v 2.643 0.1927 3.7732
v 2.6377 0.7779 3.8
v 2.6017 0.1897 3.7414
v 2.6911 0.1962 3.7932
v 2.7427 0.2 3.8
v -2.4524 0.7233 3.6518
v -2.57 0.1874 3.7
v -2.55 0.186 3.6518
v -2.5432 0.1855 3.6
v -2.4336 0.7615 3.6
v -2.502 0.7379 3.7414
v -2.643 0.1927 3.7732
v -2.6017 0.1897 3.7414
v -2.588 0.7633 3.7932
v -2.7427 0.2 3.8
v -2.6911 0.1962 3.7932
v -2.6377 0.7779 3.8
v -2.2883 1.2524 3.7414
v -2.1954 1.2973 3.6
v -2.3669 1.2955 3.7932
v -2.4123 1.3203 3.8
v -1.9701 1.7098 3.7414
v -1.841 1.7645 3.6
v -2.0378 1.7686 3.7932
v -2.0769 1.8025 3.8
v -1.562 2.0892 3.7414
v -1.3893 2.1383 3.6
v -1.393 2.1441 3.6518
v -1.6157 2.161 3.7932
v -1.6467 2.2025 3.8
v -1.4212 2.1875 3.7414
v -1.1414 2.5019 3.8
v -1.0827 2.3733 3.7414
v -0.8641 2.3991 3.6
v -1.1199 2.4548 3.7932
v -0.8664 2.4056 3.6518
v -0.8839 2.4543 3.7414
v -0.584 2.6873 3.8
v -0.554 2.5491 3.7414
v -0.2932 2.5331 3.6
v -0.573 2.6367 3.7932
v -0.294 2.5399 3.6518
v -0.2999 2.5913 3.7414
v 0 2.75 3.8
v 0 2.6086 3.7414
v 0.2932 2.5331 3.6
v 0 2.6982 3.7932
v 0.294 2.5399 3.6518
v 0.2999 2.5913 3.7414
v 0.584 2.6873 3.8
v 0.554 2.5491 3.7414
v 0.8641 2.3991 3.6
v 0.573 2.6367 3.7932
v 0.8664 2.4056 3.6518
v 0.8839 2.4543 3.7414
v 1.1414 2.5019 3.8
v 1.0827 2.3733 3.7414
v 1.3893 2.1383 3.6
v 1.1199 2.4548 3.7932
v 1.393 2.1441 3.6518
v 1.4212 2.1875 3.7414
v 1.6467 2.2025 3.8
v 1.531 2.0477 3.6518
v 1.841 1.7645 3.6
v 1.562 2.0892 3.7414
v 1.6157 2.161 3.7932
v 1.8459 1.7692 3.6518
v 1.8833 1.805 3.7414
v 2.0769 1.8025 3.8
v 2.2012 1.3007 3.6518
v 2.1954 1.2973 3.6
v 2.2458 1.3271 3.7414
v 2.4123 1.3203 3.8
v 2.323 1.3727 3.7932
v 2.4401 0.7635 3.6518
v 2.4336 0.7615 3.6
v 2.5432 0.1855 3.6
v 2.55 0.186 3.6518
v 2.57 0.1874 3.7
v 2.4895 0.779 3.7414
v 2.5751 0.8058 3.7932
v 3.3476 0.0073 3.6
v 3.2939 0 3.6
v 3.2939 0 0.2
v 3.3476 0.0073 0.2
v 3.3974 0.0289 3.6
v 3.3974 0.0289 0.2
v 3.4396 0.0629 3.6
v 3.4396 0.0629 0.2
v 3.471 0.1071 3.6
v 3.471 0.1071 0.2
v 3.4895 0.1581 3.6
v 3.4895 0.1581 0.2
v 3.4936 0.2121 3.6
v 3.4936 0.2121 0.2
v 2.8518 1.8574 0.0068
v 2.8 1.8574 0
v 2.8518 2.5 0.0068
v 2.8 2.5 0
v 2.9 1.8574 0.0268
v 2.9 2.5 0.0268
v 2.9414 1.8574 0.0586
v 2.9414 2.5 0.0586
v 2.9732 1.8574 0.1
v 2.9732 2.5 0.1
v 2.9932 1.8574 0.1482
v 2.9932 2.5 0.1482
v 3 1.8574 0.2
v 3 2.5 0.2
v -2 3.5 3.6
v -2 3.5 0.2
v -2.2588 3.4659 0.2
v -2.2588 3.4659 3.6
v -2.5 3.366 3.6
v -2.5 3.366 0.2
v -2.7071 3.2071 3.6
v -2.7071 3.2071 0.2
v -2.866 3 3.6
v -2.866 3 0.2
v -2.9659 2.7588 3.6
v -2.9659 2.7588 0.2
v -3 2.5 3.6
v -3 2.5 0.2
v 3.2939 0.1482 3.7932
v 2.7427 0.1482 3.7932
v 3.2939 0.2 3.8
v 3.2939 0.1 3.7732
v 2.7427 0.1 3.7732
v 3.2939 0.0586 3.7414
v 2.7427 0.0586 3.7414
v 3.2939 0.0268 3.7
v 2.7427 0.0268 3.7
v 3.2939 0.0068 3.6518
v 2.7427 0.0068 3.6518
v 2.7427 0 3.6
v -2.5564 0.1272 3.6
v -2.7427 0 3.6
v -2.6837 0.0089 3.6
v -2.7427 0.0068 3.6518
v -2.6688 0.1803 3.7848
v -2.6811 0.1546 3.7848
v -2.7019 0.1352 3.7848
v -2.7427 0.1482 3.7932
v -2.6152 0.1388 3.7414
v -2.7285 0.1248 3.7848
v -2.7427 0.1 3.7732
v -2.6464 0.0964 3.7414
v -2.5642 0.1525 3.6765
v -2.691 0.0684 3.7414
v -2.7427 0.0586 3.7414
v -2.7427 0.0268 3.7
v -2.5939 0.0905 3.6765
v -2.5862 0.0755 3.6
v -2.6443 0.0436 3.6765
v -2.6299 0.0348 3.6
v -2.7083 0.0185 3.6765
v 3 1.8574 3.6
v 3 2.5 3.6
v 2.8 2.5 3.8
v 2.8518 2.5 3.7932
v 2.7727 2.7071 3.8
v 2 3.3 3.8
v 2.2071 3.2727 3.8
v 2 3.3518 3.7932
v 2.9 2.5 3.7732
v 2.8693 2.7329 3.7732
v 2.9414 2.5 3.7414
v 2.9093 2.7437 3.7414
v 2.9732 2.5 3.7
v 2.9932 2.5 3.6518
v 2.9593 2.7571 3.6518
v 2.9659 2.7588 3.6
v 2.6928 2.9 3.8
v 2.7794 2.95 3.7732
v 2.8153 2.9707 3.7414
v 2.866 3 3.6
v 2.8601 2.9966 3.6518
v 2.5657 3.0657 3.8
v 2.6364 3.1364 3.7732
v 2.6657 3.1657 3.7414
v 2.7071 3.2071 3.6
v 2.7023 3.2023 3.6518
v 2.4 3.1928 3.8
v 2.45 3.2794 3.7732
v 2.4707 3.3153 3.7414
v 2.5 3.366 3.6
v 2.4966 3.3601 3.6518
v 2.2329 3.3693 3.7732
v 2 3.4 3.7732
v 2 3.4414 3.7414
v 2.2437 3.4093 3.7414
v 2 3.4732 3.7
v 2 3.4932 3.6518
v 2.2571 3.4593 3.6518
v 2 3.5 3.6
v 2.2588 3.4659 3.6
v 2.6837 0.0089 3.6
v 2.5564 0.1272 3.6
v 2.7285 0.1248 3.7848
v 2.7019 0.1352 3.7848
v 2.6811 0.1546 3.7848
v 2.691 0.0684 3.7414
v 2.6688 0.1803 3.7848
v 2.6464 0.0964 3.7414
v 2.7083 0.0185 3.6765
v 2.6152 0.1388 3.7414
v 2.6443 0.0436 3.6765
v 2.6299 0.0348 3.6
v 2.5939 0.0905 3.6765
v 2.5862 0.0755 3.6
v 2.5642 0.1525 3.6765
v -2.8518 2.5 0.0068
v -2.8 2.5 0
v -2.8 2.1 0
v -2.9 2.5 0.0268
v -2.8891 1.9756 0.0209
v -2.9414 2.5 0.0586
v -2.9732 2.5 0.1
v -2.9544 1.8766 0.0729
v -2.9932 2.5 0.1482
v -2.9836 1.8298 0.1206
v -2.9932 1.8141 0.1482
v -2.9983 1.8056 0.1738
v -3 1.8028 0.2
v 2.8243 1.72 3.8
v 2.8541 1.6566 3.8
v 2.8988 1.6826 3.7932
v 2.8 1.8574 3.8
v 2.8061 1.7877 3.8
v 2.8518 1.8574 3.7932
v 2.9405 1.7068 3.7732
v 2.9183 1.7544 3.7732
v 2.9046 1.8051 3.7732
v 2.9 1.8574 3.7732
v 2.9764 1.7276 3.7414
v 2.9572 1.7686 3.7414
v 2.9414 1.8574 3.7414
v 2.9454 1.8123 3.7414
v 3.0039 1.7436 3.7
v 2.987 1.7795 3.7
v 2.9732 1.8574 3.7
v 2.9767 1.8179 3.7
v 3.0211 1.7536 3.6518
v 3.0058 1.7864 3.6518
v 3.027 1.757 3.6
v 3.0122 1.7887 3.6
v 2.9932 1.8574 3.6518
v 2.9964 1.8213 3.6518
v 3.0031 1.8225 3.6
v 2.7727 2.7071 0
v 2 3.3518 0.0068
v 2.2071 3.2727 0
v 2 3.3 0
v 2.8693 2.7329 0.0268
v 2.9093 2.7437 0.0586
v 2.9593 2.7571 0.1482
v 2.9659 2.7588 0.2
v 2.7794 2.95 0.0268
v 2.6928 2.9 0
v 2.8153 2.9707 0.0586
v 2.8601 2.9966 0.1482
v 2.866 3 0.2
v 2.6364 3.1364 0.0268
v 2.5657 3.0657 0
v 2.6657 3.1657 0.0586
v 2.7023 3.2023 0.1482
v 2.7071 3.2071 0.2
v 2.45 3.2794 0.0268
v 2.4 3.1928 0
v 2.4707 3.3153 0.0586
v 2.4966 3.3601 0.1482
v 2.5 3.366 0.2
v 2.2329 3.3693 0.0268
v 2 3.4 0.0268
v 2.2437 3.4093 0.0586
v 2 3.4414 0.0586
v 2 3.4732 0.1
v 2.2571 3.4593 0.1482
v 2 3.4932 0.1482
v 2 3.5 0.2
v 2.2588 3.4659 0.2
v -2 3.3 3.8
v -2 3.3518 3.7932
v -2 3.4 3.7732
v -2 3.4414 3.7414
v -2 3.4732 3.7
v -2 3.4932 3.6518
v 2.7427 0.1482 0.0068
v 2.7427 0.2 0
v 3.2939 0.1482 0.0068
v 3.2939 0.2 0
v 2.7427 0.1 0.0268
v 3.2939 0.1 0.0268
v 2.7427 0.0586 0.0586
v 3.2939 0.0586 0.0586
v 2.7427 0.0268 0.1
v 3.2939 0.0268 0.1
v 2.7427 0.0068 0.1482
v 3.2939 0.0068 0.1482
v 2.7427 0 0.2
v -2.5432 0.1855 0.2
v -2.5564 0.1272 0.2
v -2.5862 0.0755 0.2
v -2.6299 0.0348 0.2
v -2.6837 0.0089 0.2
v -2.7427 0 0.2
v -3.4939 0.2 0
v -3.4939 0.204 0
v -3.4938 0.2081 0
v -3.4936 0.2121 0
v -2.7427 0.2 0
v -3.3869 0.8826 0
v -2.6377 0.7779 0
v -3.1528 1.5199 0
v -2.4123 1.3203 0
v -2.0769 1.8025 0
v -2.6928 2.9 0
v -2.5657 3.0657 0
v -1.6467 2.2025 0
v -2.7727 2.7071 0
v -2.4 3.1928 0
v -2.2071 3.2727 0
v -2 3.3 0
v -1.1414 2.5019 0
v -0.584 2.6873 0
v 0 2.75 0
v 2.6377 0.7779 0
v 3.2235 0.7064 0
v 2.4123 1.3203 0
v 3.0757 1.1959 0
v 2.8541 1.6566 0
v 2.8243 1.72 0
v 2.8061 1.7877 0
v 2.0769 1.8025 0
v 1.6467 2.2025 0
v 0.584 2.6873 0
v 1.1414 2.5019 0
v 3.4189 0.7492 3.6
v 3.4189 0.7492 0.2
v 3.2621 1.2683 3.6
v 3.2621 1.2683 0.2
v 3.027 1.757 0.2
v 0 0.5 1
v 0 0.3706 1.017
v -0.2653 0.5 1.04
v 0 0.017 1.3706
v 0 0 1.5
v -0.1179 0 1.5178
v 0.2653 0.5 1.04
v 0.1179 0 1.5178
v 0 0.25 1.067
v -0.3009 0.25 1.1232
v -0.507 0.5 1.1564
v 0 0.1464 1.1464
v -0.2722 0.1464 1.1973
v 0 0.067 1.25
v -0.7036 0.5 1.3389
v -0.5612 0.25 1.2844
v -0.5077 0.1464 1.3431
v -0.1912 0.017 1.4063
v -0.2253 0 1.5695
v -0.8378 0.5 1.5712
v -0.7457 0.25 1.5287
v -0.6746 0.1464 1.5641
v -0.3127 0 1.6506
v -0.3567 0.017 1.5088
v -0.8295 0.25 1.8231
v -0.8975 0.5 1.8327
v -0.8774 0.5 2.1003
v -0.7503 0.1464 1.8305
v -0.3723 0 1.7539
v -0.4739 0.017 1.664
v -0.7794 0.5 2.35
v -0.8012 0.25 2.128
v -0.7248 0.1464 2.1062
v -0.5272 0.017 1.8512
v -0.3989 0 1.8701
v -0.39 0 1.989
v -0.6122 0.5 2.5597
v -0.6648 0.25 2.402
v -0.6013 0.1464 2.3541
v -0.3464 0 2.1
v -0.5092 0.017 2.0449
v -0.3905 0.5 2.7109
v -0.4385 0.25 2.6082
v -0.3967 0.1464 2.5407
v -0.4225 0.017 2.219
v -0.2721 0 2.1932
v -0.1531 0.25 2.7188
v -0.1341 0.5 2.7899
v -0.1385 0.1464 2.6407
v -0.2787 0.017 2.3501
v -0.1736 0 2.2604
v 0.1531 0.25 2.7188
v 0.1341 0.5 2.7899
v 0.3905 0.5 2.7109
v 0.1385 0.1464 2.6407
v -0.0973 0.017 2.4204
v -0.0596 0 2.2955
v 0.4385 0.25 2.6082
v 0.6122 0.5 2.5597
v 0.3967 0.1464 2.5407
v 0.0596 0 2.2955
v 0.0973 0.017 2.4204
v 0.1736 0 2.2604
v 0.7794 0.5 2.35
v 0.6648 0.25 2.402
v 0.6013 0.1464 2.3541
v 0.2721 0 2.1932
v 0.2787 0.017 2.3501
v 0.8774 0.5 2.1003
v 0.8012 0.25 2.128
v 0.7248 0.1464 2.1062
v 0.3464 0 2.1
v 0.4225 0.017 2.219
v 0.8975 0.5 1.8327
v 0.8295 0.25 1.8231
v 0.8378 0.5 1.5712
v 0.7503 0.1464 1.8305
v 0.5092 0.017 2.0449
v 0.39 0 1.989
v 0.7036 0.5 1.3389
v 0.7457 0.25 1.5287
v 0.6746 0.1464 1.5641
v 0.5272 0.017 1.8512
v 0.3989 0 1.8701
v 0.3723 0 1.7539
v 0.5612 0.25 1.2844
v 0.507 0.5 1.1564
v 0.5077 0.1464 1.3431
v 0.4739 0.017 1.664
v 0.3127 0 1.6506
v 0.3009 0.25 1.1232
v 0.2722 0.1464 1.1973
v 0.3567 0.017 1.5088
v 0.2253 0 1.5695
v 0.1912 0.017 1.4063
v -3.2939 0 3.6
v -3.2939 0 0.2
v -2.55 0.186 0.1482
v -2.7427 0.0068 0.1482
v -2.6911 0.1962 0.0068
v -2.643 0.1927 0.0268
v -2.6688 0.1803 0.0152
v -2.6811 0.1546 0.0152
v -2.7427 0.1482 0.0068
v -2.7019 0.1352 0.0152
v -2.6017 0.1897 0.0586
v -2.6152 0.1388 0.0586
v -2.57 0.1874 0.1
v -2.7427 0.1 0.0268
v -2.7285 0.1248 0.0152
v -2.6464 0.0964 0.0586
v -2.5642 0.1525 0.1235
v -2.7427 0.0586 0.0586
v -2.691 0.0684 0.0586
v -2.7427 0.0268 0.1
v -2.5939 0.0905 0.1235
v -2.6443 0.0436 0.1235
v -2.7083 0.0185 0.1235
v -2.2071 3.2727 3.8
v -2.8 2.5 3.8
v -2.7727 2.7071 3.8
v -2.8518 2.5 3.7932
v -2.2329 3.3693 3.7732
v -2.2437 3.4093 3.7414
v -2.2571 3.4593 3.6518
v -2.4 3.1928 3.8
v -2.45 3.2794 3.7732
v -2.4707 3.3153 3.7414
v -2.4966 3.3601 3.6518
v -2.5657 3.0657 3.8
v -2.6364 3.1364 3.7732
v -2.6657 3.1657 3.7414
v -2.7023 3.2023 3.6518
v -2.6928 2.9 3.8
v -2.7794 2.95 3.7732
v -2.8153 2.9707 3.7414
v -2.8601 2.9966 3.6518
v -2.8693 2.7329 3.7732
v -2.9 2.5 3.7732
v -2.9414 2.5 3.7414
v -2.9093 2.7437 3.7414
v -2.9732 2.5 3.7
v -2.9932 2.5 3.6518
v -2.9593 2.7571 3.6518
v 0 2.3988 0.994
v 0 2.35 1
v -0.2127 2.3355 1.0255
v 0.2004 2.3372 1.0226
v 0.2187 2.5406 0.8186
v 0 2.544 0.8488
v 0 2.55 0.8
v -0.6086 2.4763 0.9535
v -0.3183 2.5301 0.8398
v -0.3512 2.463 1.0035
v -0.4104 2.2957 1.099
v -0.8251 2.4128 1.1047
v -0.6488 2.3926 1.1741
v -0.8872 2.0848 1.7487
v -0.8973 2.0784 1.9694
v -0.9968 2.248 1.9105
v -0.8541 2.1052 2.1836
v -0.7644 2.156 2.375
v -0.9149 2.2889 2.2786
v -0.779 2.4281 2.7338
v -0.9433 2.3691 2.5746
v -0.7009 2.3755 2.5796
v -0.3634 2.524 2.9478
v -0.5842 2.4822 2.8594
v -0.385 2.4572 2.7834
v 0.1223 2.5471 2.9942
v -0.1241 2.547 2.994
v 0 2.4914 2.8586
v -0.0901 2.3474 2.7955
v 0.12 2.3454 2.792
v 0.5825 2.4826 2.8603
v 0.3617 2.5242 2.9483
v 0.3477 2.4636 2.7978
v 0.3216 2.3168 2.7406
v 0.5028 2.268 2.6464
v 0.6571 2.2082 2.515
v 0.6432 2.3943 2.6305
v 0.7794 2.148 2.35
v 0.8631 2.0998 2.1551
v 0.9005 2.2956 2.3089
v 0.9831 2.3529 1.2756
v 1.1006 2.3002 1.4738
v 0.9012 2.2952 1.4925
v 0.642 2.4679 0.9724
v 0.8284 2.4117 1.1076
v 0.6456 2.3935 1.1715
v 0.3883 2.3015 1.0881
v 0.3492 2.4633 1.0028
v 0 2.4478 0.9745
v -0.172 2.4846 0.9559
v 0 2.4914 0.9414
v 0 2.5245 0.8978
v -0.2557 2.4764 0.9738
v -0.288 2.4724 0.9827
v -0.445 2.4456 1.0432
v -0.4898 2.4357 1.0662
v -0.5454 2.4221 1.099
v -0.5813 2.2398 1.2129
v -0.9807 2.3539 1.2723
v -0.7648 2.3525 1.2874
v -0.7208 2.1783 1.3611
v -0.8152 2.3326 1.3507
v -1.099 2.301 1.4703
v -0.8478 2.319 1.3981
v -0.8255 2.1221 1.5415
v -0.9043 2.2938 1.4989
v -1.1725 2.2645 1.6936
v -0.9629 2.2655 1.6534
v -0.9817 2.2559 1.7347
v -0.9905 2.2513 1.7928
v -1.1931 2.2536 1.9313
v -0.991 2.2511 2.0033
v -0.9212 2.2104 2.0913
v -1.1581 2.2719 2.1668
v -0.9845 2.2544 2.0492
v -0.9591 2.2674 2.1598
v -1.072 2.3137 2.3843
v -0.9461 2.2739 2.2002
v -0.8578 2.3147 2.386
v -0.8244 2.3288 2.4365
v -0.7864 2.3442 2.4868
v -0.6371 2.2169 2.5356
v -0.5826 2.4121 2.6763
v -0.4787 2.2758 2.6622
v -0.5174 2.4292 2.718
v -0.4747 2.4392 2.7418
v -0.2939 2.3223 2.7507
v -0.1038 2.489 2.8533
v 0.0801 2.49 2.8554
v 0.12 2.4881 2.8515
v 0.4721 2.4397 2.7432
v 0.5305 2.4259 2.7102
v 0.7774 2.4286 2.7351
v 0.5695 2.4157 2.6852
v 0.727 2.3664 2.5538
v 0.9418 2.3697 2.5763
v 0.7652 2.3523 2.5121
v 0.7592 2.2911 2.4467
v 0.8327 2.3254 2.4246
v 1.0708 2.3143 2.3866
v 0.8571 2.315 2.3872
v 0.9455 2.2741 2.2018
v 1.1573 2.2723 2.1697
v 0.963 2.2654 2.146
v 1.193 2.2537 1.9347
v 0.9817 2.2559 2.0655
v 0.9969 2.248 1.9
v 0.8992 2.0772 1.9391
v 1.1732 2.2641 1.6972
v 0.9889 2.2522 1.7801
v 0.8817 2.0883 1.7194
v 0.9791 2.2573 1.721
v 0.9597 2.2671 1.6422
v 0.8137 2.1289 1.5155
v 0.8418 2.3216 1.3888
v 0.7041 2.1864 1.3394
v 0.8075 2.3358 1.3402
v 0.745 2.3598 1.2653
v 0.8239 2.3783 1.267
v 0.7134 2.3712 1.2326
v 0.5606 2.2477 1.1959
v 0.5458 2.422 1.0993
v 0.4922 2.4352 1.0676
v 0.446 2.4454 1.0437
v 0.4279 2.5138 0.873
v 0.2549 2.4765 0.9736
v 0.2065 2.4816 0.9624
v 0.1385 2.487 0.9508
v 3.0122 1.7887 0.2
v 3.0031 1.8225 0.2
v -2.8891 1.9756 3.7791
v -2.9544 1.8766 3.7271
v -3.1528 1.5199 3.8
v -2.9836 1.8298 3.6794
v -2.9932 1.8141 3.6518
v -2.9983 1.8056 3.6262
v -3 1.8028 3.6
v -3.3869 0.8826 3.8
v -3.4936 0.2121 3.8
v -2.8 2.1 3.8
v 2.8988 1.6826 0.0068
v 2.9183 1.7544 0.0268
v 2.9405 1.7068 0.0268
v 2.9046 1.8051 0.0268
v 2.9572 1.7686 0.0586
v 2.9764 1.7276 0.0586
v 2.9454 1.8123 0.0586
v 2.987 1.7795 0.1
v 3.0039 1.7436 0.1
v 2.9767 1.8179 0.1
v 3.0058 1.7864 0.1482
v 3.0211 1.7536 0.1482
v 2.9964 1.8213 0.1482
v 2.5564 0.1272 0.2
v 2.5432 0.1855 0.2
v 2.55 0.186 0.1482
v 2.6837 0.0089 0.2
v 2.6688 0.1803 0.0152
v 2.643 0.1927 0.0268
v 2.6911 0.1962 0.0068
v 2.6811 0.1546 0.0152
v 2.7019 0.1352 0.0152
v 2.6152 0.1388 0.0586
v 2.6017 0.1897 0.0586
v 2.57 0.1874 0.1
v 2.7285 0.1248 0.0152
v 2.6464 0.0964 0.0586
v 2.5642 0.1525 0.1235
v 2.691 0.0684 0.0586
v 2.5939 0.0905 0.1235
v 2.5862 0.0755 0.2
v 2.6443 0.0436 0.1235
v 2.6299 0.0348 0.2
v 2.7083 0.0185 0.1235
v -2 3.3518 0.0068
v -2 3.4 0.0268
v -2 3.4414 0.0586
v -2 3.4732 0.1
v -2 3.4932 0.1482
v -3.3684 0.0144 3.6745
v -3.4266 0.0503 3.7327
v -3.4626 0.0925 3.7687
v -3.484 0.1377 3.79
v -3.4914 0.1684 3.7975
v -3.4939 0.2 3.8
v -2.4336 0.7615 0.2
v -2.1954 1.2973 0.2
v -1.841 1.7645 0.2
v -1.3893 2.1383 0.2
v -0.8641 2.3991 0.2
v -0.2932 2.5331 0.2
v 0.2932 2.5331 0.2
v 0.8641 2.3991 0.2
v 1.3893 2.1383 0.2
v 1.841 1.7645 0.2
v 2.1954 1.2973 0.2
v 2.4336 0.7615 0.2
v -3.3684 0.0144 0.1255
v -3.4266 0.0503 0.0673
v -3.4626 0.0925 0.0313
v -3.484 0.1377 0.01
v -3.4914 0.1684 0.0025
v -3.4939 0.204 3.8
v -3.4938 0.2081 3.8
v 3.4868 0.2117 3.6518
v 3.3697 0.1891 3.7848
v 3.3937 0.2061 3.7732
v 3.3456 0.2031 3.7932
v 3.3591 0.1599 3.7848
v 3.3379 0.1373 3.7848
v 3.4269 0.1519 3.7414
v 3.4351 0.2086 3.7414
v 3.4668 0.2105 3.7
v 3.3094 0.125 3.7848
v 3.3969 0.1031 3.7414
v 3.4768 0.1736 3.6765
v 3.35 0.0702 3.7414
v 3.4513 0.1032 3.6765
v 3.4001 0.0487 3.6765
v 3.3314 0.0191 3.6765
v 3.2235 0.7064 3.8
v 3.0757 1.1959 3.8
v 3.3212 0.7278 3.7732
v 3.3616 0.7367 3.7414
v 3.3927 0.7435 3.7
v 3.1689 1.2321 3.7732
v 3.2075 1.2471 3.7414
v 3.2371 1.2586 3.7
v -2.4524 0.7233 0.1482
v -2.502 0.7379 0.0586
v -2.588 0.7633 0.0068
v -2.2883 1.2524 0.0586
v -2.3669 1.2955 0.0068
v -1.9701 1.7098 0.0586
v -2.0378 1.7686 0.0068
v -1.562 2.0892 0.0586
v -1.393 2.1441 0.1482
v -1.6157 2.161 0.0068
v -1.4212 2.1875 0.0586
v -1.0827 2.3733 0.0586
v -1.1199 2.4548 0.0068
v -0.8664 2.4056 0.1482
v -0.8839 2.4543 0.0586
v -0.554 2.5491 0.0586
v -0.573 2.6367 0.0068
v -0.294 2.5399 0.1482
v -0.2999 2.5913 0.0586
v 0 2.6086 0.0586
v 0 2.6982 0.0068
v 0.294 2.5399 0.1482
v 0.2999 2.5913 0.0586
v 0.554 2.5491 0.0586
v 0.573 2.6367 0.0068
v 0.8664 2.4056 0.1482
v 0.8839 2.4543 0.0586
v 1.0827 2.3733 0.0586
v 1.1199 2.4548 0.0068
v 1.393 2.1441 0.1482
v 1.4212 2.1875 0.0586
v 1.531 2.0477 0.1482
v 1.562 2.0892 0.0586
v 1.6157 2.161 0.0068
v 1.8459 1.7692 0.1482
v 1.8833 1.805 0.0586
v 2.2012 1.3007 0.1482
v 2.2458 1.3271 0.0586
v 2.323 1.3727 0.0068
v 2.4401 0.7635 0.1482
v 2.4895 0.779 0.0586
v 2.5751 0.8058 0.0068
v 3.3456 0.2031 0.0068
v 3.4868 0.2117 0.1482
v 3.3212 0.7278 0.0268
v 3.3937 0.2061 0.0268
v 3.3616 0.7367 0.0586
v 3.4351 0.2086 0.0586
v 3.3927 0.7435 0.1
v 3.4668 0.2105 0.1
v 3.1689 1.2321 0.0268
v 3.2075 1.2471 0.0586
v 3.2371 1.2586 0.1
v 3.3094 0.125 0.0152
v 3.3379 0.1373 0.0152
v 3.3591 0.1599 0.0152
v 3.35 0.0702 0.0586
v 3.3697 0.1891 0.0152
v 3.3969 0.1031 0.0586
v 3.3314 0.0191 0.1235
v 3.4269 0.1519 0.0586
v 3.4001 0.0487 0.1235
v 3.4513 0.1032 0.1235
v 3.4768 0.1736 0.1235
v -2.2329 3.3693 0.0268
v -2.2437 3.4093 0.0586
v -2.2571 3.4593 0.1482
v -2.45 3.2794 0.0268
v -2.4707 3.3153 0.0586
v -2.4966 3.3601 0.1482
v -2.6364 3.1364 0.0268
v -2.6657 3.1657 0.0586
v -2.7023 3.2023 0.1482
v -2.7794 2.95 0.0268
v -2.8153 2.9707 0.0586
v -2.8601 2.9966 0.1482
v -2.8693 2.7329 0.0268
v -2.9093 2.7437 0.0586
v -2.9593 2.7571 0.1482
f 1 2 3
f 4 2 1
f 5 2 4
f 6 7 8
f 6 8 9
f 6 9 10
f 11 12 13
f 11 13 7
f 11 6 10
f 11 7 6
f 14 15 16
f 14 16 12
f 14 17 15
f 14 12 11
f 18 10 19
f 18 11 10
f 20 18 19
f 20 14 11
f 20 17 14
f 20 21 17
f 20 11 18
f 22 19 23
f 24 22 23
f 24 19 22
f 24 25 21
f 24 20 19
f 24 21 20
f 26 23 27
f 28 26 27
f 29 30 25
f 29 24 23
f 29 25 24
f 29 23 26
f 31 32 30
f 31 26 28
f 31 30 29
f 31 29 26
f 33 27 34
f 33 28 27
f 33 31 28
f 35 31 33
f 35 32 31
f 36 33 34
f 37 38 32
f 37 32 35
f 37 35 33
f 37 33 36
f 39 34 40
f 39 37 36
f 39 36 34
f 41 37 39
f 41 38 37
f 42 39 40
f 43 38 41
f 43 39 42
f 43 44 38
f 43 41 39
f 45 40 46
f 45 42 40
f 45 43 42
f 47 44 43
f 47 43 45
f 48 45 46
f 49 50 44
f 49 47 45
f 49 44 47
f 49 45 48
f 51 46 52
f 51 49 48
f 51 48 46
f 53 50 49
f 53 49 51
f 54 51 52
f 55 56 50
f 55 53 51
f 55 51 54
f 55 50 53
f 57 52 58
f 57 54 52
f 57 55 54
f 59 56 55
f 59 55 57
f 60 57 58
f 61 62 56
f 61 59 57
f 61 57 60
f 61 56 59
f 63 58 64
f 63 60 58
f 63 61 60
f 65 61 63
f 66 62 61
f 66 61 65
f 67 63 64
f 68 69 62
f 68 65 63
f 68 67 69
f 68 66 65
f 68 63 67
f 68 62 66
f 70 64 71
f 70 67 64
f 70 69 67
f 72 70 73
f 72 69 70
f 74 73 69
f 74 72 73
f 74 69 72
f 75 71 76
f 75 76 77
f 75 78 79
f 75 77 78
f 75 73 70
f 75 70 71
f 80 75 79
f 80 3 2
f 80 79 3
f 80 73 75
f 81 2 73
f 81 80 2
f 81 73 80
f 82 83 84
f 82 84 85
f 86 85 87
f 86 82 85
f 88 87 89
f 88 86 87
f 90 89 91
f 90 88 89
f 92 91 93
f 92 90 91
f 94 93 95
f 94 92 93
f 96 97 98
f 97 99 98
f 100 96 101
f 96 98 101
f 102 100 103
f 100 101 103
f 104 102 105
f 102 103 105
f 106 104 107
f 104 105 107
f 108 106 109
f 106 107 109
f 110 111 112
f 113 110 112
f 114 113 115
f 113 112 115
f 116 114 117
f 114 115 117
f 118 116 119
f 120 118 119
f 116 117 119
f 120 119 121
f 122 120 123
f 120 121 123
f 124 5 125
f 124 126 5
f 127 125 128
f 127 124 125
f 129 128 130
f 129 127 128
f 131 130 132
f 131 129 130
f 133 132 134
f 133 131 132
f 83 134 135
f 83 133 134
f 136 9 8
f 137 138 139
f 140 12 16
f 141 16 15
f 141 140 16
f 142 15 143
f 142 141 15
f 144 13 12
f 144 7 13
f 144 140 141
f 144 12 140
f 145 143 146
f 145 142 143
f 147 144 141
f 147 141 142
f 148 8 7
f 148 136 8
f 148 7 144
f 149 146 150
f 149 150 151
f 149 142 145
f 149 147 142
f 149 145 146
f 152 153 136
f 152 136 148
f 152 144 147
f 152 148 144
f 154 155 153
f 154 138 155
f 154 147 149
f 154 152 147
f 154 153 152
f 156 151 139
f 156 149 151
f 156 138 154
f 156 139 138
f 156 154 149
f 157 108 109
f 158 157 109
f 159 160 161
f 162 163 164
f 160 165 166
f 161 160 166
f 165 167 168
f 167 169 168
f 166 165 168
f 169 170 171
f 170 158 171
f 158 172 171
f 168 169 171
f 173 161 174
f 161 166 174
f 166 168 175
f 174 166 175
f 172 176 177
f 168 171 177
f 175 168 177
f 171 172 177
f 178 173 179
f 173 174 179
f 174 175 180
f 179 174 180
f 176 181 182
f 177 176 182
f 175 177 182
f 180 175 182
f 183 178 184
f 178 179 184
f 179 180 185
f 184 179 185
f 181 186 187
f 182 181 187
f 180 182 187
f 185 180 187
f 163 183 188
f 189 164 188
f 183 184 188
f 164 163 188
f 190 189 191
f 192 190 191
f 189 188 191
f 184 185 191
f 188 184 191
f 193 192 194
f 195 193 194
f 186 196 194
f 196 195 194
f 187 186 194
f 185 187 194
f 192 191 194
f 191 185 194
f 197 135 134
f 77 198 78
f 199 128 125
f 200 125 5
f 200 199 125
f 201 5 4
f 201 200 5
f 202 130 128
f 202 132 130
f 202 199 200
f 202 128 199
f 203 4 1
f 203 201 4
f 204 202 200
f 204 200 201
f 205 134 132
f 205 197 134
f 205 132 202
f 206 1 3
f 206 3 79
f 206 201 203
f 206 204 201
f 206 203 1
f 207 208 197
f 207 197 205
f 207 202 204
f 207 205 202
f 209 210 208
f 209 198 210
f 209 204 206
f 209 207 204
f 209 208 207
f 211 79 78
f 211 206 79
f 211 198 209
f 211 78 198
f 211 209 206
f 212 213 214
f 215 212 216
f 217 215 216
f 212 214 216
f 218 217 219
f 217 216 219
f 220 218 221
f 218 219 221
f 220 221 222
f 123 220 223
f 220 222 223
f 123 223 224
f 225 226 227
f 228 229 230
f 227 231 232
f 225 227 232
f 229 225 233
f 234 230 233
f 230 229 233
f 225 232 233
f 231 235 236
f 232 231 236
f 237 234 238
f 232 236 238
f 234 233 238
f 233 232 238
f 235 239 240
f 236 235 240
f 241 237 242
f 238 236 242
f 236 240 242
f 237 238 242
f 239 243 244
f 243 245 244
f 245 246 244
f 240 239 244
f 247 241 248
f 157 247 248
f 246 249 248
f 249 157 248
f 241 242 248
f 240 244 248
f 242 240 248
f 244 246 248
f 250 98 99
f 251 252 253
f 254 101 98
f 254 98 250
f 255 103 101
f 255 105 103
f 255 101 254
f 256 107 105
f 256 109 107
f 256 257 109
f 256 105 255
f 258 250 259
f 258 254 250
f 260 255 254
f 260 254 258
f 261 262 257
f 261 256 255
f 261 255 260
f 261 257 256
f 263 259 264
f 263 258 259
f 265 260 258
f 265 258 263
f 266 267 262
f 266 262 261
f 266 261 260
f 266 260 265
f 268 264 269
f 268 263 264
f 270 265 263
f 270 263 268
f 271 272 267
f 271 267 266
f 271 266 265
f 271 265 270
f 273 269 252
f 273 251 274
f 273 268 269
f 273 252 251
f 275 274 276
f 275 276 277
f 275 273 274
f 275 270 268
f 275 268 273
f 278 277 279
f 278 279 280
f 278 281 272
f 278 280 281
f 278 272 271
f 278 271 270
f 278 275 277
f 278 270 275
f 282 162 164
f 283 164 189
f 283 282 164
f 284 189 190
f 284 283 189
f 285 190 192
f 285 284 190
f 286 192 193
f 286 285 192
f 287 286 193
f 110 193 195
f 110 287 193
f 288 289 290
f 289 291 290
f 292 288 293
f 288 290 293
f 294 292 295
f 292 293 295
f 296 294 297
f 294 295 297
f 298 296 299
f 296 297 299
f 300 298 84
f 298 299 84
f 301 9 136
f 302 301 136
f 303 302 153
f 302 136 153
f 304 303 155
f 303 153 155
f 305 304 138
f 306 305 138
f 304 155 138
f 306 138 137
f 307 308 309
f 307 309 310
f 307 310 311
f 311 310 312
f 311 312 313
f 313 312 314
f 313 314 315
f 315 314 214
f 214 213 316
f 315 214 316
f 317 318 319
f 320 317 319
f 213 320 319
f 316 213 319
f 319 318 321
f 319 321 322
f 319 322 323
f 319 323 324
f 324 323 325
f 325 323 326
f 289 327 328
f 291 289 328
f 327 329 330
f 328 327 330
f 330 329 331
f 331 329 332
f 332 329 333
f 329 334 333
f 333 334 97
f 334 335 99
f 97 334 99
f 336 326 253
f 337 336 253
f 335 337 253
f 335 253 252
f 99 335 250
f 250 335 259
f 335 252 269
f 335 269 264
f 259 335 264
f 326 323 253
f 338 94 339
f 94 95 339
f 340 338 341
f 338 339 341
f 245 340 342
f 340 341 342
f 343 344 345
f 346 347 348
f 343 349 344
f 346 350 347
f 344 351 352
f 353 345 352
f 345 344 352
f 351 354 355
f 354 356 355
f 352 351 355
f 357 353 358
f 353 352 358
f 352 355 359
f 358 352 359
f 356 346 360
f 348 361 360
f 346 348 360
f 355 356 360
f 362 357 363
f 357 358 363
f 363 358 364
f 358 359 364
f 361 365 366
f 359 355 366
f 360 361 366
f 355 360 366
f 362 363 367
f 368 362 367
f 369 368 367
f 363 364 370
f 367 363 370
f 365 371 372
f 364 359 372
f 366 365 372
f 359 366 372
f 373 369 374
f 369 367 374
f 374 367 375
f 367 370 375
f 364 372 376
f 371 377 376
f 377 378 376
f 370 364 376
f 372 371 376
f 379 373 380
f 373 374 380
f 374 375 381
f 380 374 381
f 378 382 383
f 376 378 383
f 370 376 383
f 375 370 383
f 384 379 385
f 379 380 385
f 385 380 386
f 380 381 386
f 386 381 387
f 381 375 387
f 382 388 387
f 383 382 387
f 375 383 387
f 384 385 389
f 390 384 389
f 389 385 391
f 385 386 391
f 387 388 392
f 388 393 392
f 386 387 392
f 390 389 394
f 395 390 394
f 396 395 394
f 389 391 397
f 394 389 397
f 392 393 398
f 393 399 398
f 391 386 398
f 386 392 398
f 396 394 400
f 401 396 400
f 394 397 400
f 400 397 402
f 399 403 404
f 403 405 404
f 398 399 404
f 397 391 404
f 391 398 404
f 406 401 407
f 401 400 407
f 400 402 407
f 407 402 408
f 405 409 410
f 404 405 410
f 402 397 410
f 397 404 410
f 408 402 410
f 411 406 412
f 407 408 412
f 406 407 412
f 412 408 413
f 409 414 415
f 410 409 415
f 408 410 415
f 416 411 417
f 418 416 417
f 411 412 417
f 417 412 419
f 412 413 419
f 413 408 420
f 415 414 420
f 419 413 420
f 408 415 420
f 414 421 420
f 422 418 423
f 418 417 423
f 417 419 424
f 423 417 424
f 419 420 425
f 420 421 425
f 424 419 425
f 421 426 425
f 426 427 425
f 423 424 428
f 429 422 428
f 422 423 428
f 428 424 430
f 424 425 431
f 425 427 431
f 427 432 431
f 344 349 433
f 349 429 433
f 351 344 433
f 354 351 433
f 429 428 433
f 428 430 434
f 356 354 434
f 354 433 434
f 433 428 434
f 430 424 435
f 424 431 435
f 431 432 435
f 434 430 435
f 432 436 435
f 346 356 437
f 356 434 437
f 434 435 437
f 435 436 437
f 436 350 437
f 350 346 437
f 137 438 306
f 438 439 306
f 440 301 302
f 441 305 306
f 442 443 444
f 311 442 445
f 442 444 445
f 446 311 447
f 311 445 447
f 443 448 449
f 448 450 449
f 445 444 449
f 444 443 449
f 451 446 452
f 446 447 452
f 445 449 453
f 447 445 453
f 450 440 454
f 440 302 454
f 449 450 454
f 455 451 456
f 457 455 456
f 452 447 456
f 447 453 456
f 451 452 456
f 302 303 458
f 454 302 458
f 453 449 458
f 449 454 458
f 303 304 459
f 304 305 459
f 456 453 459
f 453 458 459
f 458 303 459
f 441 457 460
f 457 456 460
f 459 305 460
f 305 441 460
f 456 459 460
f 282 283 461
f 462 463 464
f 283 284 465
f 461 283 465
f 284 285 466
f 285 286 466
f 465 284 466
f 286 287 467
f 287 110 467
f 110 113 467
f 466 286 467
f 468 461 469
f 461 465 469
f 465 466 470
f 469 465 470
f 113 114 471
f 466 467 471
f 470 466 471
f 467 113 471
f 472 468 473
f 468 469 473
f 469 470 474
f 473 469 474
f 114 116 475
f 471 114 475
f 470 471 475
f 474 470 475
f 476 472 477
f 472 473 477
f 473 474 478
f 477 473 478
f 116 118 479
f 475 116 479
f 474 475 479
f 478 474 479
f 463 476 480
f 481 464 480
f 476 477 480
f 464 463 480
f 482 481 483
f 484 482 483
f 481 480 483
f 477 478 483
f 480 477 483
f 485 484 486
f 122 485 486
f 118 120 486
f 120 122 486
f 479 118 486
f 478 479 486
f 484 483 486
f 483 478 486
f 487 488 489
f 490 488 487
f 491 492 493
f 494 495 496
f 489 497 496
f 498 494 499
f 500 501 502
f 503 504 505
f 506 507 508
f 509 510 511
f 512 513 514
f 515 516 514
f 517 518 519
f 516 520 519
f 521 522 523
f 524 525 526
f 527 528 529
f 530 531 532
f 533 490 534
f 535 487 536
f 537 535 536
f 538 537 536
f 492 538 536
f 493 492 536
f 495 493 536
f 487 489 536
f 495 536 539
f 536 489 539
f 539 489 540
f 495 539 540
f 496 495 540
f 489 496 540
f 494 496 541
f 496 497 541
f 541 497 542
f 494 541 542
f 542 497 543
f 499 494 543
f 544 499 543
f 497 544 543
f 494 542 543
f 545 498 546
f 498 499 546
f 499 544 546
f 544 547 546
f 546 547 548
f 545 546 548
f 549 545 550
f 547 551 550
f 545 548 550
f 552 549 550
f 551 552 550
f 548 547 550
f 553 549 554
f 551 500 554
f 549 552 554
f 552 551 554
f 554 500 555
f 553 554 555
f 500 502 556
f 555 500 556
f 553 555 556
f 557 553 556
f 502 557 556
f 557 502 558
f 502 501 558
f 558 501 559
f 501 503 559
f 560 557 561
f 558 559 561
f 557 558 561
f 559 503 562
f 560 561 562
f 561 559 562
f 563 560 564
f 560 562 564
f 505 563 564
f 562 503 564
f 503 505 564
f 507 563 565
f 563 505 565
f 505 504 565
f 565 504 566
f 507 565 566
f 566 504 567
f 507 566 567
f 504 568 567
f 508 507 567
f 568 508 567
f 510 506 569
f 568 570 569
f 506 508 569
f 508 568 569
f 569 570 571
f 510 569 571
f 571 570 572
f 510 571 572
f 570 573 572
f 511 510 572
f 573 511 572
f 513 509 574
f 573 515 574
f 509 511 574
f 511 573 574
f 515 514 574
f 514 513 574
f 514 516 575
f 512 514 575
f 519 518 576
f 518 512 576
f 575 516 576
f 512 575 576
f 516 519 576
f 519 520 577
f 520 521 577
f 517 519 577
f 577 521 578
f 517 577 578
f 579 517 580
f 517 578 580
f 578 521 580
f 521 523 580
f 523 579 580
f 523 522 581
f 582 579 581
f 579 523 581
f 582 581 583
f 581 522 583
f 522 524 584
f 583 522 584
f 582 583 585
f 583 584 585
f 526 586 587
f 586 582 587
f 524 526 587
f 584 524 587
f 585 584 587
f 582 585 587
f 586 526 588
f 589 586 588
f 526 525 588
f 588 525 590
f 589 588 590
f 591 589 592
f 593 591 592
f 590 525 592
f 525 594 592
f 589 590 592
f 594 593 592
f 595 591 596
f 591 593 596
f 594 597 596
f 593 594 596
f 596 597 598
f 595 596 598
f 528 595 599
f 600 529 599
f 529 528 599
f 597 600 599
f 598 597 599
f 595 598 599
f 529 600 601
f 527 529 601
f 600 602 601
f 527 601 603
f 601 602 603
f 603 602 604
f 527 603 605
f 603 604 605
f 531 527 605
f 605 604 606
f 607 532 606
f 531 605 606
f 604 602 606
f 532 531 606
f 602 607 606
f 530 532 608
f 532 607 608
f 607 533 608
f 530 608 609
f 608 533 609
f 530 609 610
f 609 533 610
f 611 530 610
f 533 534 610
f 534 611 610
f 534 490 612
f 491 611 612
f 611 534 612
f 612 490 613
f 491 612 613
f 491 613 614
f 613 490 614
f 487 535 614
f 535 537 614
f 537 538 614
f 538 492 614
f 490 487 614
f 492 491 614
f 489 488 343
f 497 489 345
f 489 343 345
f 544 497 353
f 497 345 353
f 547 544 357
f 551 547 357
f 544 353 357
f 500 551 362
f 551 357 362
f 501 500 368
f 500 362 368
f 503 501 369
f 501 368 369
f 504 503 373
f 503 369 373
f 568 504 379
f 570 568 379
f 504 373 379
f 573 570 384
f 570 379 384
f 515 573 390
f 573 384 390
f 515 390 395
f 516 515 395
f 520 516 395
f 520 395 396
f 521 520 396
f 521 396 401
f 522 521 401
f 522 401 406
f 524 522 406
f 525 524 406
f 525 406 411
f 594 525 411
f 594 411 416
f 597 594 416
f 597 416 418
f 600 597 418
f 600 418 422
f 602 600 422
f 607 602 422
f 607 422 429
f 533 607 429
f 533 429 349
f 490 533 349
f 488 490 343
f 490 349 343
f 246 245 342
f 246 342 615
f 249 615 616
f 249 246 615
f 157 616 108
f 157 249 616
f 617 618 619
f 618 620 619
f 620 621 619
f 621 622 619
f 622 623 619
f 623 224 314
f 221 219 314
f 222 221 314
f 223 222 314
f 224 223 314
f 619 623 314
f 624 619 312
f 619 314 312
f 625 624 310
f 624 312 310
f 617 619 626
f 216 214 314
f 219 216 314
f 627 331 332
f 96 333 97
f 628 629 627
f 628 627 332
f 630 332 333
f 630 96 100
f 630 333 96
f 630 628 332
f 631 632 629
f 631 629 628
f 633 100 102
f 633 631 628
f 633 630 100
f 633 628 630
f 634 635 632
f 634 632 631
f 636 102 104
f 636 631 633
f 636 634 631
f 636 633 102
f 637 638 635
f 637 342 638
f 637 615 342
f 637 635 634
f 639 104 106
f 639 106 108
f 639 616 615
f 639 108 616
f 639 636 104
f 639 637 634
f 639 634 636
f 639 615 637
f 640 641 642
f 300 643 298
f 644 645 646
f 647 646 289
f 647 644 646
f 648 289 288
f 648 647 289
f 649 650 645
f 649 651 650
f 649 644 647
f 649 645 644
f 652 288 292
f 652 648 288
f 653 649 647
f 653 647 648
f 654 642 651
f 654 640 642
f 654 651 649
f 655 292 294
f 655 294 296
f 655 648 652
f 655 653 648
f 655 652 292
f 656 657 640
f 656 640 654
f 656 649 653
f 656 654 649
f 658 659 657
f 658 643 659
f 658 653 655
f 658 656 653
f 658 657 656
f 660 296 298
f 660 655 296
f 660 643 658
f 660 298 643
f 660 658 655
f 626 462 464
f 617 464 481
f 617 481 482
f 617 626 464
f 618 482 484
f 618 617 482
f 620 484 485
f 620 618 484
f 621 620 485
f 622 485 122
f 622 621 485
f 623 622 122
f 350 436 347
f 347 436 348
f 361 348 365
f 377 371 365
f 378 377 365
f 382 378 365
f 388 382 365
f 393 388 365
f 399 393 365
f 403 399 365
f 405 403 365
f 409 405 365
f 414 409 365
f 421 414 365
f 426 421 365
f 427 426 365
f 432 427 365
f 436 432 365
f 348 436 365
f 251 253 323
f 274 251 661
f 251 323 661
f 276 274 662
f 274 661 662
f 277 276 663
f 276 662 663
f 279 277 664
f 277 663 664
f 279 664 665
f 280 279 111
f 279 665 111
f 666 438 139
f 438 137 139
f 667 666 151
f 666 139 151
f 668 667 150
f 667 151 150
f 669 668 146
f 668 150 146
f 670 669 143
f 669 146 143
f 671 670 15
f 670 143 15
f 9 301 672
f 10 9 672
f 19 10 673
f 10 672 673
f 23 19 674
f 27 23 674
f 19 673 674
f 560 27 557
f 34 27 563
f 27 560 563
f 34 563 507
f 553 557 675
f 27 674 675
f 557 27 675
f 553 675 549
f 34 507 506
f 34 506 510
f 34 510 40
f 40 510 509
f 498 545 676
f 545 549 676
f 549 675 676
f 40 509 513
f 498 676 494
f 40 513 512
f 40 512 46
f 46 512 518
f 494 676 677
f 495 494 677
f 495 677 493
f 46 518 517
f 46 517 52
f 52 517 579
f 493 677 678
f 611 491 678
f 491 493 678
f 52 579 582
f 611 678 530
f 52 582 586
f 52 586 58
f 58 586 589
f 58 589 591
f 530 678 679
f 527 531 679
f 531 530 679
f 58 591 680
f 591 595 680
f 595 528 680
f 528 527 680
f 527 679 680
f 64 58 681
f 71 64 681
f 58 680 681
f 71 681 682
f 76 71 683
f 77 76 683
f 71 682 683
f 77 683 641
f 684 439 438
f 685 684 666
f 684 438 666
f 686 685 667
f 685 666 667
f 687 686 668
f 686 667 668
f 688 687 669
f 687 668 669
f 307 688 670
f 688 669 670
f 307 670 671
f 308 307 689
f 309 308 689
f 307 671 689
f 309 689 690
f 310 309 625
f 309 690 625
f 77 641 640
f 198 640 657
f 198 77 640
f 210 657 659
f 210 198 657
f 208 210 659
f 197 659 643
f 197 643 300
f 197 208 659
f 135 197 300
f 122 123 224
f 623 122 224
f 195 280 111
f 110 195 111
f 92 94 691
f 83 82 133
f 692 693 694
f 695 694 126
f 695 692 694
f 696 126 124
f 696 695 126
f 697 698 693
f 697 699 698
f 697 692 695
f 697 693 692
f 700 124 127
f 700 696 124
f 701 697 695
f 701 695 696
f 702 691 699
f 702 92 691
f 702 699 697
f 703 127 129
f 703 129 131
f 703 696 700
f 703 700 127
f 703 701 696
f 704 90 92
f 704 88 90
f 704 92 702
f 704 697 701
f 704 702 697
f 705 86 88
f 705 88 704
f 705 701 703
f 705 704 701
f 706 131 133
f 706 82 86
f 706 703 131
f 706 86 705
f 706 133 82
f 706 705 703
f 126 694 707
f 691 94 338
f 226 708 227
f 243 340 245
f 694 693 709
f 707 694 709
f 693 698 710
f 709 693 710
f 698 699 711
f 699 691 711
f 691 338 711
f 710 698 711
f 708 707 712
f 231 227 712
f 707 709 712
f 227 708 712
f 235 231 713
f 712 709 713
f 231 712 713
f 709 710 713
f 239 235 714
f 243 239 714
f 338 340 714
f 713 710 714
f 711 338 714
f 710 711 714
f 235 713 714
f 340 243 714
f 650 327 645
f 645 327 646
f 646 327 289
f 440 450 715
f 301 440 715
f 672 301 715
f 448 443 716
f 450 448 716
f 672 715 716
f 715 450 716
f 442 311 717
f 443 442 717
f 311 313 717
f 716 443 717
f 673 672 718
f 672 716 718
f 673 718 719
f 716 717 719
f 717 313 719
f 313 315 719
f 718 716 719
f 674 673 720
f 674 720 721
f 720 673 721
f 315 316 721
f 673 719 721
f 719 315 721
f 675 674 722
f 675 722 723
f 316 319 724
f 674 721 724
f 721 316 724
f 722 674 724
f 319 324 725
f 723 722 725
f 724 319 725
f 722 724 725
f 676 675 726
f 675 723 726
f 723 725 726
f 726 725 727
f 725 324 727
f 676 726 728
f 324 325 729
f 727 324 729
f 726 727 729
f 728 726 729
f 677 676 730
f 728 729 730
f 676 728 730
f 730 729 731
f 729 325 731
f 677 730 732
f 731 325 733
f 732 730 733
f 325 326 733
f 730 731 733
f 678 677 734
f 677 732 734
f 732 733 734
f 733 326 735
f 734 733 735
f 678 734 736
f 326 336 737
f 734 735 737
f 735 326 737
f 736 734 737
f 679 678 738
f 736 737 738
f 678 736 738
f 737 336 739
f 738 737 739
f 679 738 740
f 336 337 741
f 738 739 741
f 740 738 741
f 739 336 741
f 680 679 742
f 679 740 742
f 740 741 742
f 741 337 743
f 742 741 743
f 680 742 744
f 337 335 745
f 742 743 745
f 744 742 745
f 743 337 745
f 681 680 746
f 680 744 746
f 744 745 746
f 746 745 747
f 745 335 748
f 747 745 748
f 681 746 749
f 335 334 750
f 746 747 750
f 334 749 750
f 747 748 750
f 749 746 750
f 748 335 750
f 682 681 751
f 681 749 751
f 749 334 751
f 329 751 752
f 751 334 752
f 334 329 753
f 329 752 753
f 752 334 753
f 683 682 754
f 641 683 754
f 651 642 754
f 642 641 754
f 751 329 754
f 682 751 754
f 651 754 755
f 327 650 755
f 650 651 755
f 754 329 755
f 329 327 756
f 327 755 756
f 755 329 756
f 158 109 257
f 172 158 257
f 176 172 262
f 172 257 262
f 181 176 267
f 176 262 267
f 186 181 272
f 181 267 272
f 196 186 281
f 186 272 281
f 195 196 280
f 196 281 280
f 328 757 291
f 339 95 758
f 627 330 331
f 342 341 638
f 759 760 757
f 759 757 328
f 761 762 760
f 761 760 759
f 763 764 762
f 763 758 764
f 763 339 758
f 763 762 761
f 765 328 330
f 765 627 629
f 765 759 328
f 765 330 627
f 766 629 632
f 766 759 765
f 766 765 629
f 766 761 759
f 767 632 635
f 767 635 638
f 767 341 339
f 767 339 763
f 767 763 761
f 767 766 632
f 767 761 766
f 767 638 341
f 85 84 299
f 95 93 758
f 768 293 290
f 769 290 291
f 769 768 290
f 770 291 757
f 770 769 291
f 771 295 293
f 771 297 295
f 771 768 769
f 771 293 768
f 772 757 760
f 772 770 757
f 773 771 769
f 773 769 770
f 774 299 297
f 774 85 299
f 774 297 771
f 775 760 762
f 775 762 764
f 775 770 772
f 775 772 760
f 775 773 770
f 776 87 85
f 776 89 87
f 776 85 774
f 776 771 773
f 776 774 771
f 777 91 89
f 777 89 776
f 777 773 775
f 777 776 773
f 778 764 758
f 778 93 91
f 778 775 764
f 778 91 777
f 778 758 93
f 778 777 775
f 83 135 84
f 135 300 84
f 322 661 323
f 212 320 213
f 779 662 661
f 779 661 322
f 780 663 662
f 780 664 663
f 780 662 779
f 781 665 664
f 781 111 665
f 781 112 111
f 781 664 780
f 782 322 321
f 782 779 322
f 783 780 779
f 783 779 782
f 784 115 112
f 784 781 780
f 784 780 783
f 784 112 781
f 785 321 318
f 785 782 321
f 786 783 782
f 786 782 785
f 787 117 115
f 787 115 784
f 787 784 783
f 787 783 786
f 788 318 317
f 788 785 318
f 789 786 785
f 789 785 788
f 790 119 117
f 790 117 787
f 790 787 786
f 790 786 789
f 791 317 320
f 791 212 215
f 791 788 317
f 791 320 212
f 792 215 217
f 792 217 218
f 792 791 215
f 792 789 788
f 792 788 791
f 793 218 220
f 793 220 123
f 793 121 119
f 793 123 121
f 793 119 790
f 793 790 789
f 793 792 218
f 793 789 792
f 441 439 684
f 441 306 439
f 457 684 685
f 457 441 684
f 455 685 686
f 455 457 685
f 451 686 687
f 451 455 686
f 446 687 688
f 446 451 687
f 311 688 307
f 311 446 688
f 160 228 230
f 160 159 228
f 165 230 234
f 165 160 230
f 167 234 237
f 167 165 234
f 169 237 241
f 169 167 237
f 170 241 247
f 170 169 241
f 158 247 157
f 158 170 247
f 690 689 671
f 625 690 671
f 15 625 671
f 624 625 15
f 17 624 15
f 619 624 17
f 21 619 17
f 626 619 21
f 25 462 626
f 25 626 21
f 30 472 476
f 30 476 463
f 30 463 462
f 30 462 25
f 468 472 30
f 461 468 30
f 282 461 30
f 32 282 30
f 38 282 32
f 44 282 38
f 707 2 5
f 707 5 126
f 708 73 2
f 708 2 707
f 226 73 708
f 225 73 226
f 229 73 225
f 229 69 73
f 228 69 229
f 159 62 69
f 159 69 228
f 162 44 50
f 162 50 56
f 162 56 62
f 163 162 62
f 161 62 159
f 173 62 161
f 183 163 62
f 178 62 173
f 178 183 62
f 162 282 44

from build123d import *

# Parameters (mm, degrees)
BOSS_EXTRUDE1_DEPTH = 3.8
SKETCH3_R           = 0.9
BOSS_EXTRUDE2_DEPTH = 3
FILLET1_R           = 0.5
FILLET3_R           = 0.2


with BuildPart() as part:
    # Sketch2 → Boss-Extrude1 (new body)
    with BuildSketch(Plane.XY):
        with BuildLine():
            Line((-3.5, 0), (-2.55, 0))
            ThreePointArc((-2.55, 0), (0, 2.55), (2.55, 0))
            Line((2.55, 0), (3.5, 0))
            ThreePointArc((3.5, 0), (3.372684391, 0.935414347), (3, 1.802775638))
            Line((3, 1.802775638), (3, 2.5))
            ThreePointArc((3, 2.5), (2.707106781, 3.207106781), (2, 3.5))
            Line((2, 3.5), (0, 3.5))
            Line((0, 3.5), (-2, 3.5))
            ThreePointArc((-2, 3.5), (-2.707106781, 3.207106781), (-3, 2.5))
            Line((-3, 2.5), (-3, 1.802775638))
            ThreePointArc((-3, 1.802775638), (-3.372684391, 0.935414347), (-3.5, 0))
        make_face()
    extrude(amount=BOSS_EXTRUDE1_DEPTH)

    # Sketch3 → Boss-Extrude2 (add)
    with BuildSketch(Plane(origin=(0, 0, 0), x_dir=(1, 0, 0), z_dir=(0, 1, 0))):
        with Locations(Location((0, -1.9, 0), (0, 0, 90))):
            Circle(SKETCH3_R)
    extrude(amount=BOSS_EXTRUDE2_DEPTH)

    # Fillet1
    fillet1_edges = [part.edges().sort_by_distance(p)[0] for p in [
        (0, 0, 2.8),
    ]]
    fillet(fillet1_edges, radius=FILLET1_R)

    # Fillet3
    fillet3_edges = [part.edges().sort_by_distance(p)[0] for p in [
        (-3.025, 0, 3.8),
        (-3.025, 0, 0),
        (3.372684391, 0.935414347, 3.8),
        (3.372684391, 0.935414347, 0),
        (3.025, 0, 3.8),
        (3.5, 0, 1.9),
        (3.025, 0, 0),
        (0, 2.55, 2.8),
        (-2.55, 0, 1.9),
        (0, 2.55, 3.8),
        (2.55, 0, 1.9),
        (0, 2.55, 0),
        (-3, 2.151387819, 3.8),
        (-3, 2.151387819, 0),
        (-2.707106781, 3.207106781, 3.8),
        (-2.707106781, 3.207106781, 0),
        (0, 3.5, 3.8),
        (0, 3.5, 0),
        (2.707106781, 3.207106781, 3.8),
        (2.707106781, 3.207106781, 0),
        (3, 2.151387819, 3.8),
        (3, 2.151387819, 0),
        (-3.5, 0, 1.9),
        (3, 1.802775638, 1.9),
    ]]
    fillet(fillet3_edges, radius=FILLET3_R)


solid = part.part
